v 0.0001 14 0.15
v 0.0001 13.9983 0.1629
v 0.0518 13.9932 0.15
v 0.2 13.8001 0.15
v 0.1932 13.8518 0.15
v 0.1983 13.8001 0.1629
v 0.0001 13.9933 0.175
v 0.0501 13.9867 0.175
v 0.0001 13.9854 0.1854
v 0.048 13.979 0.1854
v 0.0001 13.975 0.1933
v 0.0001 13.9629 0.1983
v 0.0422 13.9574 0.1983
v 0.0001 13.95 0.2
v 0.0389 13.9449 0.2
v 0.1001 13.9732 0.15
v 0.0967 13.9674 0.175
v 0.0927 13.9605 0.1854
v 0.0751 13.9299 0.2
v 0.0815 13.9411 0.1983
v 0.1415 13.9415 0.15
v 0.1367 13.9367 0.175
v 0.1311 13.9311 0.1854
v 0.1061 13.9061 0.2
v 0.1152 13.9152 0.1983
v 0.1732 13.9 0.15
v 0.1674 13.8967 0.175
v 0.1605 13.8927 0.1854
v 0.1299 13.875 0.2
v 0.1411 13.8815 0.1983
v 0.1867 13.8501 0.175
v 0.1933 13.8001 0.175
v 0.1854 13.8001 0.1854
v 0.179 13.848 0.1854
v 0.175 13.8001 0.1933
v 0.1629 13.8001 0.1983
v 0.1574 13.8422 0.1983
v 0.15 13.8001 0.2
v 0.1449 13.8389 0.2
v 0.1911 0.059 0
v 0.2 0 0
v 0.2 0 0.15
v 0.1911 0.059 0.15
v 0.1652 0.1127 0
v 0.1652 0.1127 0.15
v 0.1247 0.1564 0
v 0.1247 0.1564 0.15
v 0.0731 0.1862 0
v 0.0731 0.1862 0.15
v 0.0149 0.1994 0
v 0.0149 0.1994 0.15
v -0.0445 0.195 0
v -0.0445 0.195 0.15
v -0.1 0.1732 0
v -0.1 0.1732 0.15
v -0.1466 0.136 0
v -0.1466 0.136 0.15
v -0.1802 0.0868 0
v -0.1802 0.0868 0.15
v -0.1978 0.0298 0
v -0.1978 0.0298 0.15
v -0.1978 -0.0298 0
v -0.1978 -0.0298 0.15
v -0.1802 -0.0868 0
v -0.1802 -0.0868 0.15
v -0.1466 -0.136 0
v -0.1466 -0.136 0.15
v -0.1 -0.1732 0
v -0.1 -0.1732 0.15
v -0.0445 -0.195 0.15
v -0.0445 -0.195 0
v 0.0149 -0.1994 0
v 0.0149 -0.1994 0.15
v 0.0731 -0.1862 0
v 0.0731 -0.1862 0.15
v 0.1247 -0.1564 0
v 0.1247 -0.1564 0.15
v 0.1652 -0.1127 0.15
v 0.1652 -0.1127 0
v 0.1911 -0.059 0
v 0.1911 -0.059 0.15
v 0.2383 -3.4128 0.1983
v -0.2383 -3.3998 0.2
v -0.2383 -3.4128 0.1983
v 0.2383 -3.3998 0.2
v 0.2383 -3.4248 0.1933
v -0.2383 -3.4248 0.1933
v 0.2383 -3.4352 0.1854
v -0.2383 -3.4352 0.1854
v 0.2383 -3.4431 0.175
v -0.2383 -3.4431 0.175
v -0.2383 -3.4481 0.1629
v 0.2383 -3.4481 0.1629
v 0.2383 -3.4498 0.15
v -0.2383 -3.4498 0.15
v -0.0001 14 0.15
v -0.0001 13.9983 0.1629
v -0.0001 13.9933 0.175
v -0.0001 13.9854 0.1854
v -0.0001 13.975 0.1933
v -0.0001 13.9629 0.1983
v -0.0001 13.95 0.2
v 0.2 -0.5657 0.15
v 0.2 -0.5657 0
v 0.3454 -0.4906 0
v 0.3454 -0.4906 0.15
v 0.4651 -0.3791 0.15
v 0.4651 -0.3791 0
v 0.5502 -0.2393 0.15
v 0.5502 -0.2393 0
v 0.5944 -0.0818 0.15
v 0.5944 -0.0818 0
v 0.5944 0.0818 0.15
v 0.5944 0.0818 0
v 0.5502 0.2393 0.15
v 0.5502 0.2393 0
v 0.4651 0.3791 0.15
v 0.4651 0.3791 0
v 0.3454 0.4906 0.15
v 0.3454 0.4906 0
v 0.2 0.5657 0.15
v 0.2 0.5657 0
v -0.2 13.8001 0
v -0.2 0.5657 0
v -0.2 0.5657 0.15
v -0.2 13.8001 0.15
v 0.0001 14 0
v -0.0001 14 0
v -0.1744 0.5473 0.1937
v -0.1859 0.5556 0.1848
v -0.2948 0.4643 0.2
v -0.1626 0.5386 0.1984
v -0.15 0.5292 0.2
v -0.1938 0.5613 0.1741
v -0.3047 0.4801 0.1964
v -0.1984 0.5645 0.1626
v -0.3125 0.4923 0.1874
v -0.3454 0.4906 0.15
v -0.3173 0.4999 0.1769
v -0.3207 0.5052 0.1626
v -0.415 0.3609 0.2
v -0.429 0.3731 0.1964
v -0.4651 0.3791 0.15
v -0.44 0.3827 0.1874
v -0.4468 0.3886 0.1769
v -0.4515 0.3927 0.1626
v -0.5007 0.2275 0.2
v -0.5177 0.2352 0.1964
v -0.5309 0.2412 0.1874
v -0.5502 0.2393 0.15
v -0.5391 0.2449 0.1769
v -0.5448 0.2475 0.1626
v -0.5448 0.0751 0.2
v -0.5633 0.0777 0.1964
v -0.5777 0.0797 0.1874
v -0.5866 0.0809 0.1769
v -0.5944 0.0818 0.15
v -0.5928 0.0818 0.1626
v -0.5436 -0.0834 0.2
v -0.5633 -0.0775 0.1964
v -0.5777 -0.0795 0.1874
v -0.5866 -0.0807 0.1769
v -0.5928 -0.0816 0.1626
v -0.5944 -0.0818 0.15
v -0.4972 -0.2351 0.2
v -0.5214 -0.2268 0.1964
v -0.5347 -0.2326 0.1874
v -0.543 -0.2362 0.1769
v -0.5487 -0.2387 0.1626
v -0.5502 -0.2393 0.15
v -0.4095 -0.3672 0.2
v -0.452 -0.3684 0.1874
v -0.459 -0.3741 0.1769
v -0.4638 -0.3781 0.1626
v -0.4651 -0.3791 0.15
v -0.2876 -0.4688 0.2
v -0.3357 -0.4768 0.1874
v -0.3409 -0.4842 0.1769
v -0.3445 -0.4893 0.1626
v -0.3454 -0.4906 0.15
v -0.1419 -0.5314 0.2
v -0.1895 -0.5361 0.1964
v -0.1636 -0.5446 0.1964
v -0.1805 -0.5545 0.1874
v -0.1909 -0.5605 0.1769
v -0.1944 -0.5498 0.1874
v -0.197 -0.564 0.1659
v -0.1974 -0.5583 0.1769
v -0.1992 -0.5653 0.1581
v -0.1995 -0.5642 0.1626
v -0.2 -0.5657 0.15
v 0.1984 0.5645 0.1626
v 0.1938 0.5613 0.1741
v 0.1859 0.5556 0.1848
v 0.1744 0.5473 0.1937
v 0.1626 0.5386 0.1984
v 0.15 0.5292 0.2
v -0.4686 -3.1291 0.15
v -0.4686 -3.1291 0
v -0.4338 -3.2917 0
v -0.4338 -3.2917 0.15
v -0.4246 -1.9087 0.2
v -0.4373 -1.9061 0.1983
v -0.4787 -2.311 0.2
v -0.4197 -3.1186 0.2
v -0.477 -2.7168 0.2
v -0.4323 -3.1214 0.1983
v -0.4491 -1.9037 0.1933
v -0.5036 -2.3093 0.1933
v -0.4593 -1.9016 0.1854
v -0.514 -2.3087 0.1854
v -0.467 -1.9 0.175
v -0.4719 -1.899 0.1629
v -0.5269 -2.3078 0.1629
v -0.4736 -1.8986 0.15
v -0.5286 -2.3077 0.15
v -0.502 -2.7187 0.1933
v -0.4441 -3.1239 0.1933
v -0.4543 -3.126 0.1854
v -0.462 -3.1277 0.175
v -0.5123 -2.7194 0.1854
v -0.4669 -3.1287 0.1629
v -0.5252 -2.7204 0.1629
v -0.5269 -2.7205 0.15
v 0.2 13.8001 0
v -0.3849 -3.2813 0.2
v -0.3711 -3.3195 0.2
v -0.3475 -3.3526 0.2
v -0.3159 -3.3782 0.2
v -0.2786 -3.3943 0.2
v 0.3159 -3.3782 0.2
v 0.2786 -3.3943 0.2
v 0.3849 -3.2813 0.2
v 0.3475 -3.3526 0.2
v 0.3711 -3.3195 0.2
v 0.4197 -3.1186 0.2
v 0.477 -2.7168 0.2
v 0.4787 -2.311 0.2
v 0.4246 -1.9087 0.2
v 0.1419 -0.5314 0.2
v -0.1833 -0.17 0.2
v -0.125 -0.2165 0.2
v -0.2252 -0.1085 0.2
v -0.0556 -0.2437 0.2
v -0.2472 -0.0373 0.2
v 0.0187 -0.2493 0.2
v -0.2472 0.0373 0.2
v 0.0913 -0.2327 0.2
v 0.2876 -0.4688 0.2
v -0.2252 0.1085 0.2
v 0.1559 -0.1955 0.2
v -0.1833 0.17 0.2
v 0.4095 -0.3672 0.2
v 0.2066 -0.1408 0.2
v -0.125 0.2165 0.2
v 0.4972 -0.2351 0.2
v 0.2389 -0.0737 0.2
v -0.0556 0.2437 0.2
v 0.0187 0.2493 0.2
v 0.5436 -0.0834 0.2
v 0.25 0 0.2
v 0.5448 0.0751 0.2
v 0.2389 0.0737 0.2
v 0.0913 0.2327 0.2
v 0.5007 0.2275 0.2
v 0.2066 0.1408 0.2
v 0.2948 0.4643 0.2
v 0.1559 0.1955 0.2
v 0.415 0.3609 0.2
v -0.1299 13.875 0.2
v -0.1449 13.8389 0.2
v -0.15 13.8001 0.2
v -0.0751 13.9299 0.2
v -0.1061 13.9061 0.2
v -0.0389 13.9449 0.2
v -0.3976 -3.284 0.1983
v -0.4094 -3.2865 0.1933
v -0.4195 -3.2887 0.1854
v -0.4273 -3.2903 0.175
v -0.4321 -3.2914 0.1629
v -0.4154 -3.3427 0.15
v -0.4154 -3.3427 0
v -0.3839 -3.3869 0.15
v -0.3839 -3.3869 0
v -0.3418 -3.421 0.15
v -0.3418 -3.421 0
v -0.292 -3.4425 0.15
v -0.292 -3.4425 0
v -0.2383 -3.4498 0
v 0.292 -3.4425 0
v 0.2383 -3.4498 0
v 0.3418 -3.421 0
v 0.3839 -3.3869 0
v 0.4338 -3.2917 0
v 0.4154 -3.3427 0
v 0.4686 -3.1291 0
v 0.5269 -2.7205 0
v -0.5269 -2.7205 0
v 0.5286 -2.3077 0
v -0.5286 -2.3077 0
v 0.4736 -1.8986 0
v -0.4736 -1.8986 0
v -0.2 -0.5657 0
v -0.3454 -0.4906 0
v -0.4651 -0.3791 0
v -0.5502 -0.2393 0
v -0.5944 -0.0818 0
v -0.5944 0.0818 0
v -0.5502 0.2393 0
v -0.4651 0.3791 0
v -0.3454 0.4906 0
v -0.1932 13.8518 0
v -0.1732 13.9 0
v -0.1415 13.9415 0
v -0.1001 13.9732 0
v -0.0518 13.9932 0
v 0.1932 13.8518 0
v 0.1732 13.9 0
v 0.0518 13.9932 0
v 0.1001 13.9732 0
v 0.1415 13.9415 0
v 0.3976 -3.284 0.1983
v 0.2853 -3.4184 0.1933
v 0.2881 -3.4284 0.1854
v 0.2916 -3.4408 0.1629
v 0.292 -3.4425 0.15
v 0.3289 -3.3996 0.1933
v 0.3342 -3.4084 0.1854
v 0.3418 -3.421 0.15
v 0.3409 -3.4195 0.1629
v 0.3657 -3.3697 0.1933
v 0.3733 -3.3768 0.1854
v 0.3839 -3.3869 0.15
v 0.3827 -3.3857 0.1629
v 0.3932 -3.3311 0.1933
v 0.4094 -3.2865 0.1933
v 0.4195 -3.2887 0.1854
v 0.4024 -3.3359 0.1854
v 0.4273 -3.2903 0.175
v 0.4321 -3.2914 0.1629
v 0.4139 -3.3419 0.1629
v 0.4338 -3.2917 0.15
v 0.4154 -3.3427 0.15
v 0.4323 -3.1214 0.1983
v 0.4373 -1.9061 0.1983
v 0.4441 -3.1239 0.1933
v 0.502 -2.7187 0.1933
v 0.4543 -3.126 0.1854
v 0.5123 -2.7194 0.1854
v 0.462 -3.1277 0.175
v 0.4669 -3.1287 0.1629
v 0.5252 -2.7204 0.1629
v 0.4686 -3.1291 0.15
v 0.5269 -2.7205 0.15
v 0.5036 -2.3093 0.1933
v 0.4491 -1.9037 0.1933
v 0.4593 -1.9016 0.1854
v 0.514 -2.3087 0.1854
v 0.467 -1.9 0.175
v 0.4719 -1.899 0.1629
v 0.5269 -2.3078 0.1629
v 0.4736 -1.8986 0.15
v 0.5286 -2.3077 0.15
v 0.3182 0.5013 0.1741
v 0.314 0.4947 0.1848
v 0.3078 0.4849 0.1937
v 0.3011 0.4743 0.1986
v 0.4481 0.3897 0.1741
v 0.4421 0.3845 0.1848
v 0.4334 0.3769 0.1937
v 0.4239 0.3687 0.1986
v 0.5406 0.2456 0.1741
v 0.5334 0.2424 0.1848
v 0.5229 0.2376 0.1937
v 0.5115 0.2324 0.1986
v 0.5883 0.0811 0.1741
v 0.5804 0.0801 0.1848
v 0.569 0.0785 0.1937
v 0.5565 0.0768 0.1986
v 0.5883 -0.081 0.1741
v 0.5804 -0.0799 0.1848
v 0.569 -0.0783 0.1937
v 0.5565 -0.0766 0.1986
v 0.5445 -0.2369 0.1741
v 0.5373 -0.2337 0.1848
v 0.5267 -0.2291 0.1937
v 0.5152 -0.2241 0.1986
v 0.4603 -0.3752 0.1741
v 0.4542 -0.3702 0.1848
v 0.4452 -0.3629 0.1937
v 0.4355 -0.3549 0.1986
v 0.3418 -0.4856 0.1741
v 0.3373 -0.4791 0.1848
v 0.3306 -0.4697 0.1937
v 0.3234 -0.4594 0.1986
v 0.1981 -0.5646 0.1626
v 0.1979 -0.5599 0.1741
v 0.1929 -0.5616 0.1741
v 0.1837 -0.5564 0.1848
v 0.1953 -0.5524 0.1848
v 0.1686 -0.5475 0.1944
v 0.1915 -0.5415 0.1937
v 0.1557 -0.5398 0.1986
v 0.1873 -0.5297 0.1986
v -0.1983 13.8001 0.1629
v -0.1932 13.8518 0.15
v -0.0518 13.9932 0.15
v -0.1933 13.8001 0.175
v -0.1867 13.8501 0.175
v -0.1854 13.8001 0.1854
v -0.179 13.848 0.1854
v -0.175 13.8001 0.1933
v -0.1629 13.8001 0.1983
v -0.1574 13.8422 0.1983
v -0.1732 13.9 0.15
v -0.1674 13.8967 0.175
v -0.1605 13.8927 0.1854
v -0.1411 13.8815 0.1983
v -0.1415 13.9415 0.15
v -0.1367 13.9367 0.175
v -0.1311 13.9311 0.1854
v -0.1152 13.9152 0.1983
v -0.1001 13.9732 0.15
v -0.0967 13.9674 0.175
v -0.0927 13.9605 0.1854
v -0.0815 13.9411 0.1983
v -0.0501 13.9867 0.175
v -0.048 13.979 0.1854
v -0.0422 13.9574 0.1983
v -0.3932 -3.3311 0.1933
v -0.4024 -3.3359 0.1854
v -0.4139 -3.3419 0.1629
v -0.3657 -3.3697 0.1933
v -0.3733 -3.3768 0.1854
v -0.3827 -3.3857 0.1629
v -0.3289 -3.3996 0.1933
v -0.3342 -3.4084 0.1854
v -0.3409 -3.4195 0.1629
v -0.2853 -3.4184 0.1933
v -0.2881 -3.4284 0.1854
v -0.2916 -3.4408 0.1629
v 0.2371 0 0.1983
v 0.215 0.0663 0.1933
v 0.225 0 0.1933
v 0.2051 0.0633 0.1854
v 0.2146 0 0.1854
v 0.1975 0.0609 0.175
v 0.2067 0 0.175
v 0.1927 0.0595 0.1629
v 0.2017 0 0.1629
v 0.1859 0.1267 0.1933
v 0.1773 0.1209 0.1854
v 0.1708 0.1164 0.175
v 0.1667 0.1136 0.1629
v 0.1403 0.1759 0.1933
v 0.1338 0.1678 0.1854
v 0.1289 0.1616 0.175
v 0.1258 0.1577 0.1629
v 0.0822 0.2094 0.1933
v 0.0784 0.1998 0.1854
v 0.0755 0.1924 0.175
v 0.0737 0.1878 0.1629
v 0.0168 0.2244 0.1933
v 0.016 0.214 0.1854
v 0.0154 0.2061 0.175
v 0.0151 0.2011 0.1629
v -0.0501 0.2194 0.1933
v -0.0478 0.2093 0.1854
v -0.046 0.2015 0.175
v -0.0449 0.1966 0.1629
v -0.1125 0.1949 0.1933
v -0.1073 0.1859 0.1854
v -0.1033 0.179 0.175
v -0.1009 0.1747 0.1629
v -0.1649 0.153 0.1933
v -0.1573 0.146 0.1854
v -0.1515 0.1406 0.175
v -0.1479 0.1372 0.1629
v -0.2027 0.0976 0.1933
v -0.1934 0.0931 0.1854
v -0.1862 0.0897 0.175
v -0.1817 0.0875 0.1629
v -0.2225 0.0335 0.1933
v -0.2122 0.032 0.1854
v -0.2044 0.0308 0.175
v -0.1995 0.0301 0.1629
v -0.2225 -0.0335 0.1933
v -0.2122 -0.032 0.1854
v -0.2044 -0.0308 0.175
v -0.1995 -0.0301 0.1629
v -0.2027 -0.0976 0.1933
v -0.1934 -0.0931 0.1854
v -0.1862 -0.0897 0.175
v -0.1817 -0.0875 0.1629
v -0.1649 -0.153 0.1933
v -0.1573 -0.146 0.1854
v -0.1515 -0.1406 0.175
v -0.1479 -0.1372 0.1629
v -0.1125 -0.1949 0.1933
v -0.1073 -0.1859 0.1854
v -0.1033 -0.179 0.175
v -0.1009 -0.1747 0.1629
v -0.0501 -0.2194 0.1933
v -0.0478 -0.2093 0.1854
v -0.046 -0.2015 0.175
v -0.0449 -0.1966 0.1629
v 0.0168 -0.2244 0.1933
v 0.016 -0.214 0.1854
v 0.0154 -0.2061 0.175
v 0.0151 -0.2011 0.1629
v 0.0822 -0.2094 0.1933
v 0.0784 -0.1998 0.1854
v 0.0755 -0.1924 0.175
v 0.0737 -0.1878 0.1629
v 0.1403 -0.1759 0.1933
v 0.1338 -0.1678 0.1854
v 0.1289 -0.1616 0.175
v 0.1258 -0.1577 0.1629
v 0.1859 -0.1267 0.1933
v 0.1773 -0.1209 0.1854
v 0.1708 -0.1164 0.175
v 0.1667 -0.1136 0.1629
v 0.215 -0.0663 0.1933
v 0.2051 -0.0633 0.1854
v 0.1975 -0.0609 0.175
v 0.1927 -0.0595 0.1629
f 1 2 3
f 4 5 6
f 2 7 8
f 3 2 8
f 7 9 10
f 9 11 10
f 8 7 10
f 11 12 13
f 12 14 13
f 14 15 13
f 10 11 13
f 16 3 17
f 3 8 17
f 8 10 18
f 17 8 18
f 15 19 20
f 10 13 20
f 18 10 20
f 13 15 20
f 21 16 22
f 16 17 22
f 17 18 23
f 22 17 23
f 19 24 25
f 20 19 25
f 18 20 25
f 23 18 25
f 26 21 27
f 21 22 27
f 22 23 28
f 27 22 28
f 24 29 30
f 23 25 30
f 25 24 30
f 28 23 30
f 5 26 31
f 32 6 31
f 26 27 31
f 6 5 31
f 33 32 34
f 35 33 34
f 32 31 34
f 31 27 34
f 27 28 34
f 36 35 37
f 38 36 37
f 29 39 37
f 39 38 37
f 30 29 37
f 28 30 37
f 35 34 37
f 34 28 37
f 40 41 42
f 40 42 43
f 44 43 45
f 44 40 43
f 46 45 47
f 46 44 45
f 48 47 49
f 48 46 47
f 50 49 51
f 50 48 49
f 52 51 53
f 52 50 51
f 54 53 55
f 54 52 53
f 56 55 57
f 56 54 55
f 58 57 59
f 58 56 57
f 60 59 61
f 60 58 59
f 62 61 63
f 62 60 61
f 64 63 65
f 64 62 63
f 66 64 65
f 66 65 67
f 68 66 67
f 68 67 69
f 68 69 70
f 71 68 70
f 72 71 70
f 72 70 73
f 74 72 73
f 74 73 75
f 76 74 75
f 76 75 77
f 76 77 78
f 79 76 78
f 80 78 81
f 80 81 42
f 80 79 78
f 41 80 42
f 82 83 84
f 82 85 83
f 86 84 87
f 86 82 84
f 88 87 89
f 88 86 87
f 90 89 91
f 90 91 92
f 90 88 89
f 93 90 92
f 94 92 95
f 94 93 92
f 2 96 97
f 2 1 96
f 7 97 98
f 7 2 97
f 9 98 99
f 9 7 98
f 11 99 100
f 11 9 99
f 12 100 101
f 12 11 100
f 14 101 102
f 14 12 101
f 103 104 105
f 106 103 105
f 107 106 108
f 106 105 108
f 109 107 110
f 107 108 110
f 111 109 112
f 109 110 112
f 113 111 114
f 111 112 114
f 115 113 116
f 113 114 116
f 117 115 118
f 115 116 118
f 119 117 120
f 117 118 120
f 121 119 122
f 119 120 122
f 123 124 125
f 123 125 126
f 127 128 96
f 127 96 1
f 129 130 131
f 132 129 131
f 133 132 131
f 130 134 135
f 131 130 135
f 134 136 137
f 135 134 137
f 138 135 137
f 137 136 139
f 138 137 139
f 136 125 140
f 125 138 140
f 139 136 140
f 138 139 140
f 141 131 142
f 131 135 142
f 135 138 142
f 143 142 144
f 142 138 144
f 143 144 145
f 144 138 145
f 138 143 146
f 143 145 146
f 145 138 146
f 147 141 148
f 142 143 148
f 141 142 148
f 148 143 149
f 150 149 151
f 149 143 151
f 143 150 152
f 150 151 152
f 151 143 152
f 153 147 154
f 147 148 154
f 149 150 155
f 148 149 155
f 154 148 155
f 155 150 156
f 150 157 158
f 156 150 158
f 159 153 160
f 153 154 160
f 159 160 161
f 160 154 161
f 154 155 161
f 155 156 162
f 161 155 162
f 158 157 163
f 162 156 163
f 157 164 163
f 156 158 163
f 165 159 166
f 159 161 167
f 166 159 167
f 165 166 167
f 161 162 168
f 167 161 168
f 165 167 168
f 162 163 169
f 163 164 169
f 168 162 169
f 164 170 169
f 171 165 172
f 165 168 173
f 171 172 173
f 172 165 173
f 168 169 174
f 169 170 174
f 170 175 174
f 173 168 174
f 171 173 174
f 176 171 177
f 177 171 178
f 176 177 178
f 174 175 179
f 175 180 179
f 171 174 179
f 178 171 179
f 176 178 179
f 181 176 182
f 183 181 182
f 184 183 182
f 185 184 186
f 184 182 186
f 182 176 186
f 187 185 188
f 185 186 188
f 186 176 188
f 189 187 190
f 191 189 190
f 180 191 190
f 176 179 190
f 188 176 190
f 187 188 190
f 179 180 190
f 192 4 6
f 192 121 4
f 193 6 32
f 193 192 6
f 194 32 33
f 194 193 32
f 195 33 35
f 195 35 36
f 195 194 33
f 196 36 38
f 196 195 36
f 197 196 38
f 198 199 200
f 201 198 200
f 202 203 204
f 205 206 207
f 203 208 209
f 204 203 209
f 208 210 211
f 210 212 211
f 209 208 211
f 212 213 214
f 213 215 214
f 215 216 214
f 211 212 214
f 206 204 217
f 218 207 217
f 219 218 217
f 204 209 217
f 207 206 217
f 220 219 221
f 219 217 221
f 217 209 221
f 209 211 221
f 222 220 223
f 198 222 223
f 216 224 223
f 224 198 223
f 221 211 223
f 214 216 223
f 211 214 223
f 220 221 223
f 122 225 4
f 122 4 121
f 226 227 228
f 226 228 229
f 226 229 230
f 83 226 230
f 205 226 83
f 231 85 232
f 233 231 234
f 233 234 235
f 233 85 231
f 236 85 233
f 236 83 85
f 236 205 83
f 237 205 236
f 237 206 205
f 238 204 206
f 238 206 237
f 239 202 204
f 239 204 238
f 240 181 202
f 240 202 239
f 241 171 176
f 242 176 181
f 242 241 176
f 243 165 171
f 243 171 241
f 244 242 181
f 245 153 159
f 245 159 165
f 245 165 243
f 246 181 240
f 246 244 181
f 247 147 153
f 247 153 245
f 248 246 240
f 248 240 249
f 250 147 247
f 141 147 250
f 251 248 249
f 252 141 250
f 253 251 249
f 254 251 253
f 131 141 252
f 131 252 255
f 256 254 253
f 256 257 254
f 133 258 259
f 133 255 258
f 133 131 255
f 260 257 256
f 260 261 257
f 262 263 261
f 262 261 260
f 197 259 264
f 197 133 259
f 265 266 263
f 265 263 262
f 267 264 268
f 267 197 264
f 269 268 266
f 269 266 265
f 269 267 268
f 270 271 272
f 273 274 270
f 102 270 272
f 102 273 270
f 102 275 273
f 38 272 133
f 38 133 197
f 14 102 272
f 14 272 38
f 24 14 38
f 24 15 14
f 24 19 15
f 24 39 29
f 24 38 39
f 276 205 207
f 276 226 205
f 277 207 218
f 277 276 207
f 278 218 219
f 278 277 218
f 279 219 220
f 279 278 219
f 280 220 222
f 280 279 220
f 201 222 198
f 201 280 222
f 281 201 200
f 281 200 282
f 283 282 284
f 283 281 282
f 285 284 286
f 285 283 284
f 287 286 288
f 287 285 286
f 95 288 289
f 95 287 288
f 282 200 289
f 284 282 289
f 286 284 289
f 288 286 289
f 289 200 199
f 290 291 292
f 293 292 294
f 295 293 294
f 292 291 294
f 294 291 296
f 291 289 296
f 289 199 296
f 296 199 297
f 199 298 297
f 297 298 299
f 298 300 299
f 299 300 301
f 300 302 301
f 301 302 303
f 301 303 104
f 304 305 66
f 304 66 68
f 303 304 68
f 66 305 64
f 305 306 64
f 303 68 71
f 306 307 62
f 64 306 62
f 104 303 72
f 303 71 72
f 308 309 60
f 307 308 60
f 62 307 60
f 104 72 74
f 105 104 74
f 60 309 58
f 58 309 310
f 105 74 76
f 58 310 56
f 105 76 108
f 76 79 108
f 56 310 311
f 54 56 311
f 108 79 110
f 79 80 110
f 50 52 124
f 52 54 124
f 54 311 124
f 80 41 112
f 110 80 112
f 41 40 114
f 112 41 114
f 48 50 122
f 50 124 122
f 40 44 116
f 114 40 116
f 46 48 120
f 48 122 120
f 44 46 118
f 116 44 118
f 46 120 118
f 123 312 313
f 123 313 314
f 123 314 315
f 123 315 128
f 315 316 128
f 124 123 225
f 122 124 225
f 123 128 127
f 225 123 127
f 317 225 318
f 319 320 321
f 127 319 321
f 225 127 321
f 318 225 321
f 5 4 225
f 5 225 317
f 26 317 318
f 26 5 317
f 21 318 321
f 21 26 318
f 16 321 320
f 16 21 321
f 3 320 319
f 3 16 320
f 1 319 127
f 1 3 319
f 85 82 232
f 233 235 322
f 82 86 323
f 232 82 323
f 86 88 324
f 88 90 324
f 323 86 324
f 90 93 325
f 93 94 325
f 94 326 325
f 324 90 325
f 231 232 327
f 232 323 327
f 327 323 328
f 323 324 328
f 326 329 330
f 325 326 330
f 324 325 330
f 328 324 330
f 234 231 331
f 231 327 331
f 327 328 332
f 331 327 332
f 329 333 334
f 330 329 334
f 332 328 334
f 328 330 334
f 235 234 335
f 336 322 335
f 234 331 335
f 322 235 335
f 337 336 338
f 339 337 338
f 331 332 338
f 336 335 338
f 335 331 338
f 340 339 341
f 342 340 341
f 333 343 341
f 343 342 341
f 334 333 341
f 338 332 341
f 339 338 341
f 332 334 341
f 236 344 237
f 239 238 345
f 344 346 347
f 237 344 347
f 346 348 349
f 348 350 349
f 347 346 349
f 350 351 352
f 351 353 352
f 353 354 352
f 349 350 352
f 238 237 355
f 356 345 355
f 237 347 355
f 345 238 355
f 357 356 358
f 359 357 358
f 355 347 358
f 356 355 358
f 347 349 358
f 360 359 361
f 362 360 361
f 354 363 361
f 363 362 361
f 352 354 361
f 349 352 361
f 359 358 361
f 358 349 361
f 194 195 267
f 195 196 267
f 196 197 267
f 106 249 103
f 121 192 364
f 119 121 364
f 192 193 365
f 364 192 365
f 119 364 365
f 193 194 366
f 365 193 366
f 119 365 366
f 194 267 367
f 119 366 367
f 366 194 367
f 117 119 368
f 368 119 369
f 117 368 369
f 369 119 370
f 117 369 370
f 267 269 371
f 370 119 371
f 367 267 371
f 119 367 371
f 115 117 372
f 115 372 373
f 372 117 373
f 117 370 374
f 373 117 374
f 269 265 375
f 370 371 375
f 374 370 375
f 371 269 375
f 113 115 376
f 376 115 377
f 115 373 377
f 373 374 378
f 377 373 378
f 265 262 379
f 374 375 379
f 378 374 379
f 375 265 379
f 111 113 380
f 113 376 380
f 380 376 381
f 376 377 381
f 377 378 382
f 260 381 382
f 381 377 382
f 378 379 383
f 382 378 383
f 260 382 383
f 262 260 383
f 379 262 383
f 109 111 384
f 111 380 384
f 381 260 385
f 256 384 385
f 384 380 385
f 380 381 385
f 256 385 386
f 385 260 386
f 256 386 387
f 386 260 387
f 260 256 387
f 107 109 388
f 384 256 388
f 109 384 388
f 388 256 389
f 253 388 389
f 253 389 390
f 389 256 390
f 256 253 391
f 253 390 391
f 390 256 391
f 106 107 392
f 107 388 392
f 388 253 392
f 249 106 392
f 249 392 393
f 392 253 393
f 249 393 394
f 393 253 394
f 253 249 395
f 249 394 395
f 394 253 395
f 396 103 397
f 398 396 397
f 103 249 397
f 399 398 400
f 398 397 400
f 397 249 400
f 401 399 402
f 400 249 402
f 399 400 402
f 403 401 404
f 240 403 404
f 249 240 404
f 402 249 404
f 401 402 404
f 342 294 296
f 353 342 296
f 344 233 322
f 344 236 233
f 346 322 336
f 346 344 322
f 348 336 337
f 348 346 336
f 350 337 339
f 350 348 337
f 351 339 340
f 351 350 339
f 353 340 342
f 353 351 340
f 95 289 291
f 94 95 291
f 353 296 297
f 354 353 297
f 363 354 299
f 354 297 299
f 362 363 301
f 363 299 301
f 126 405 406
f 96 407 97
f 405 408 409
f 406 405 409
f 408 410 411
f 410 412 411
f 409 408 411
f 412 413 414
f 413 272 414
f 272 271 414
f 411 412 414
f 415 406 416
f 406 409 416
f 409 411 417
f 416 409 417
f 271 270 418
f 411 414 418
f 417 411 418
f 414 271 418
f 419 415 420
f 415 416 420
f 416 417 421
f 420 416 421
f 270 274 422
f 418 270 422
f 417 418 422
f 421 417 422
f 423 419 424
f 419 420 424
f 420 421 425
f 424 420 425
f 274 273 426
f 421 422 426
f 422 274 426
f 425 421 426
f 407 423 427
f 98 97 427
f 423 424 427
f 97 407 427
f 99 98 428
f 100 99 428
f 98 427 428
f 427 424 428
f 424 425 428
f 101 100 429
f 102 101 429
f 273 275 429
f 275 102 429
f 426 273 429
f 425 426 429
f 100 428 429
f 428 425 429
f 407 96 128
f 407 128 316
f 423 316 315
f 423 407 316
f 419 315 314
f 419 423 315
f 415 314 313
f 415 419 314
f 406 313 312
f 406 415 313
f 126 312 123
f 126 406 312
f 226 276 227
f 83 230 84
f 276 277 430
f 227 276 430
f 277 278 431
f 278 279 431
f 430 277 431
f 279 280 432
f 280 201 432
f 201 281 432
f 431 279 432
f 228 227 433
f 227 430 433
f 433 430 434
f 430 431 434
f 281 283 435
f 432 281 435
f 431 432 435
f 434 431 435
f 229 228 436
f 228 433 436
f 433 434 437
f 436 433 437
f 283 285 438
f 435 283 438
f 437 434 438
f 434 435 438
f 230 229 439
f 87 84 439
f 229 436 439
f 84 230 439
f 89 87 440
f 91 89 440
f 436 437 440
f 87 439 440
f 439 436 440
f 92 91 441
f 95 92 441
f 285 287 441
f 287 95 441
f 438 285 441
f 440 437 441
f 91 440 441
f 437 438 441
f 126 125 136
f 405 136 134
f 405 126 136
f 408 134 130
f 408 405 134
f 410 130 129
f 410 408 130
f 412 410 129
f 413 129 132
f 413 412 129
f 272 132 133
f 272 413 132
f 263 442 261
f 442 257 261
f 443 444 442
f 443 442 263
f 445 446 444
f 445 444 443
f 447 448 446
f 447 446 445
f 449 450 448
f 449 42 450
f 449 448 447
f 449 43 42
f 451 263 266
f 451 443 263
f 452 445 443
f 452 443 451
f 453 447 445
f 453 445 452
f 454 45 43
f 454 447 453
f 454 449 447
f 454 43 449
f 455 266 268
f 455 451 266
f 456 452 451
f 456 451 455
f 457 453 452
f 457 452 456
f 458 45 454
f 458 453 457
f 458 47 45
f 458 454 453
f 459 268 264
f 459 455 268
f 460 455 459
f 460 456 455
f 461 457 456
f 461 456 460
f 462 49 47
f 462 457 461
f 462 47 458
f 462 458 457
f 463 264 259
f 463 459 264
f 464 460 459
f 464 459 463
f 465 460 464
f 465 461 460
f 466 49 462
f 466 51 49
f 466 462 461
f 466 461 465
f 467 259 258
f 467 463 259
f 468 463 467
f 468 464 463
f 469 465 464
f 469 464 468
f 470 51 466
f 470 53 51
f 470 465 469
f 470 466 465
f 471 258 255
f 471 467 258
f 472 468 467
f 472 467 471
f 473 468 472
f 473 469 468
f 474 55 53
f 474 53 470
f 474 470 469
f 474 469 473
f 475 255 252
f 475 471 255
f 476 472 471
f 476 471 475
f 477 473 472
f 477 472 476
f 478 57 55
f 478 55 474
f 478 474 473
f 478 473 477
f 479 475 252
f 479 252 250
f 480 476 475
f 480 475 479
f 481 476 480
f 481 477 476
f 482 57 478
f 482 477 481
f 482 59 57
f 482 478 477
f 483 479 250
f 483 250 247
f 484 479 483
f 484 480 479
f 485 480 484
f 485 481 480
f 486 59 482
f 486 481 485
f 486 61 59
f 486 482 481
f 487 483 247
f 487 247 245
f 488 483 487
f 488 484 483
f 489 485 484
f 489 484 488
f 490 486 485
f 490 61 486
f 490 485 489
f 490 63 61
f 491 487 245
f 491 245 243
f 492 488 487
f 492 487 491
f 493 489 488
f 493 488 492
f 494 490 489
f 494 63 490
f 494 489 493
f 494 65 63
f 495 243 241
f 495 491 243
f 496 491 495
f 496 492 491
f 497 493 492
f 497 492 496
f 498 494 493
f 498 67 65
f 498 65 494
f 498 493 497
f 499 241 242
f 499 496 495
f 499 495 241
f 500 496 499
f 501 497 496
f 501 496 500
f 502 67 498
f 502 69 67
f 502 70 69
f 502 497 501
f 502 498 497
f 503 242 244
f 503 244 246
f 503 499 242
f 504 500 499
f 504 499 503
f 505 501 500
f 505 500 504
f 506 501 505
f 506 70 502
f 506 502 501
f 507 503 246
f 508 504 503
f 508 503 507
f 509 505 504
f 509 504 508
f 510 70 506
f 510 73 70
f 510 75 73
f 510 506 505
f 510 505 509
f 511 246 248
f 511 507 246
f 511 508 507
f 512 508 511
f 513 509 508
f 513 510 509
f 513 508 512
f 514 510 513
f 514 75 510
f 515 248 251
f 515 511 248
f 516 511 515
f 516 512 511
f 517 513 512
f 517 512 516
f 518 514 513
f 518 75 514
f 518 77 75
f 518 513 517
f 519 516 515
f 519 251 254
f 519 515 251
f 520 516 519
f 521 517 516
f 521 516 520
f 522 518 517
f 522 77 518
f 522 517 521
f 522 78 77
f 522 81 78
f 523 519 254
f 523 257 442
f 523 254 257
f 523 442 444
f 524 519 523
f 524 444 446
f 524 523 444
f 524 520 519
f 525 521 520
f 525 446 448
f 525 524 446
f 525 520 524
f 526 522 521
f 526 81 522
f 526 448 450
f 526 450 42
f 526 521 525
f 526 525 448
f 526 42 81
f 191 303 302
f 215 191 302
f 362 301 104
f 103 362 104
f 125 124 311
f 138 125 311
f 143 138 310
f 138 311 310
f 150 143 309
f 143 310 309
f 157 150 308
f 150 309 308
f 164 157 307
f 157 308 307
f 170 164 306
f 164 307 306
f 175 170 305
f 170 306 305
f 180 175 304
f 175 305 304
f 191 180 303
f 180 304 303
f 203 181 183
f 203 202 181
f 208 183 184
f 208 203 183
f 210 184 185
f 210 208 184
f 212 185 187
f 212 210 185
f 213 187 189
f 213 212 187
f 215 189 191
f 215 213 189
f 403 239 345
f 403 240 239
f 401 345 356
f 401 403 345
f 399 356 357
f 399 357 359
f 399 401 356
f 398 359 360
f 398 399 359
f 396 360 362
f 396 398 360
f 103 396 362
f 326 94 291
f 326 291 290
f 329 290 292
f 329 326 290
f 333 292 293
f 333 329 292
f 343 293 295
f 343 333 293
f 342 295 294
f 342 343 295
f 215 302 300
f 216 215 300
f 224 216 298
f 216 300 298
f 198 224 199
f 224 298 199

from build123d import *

# Parameters (mm, degrees)
SKETCH_1_R      = 0.6
SKETCH_1_R_2    = 0.2
EXTRUDE_1_DEPTH = 0.2
EXTRUDE_START   = -0.2
EXTRUDE_2_DEPTH = 0.2
FILLET_1_R      = 0.2
FILLET_2_R      = 0.05


with BuildPart() as part:
    # Эскиз1 → Бобышка-Вытянуть1 (new body)
    with BuildSketch(Plane.XY):
        Circle(SKETCH_1_R)
        Circle(SKETCH_1_R_2, mode=Mode.SUBTRACT)
    extrude(amount=EXTRUDE_1_DEPTH)

    # Эскиз3 → Бобышка-Вытянуть2 (add)
    with BuildSketch(Plane.XY.offset(0.2).offset(EXTRUDE_START)):
        with BuildLine():
            Line((-0.2, 0.565685425), (-0.2, 14))
            Line((-0.2, 14), (0.2, 14))
            Line((0.2, 14), (0.2, 0.565685425))
            ThreePointArc((0.2, 0.565685425), (0, 0.6), (-0.2, 0.565685425))
        make_face()
        with BuildLine():
            Line((-0.2, -0.565685425), (-0.473607186, -1.89863889))
            ThreePointArc((-0.473607186, -1.89863889), (-0.53485247, -2.514130031), (-0.468572045, -3.129099328))
            Line((-0.468572045, -3.129099328), (-0.4, -3.44981817))
            Line((-0.4, -3.44981817), (0.4, -3.44981817))
            Line((0.4, -3.44981817), (0.468572045, -3.129099328))
            ThreePointArc((0.468572045, -3.129099328), (0.53485247, -2.514130031), (0.473607186, -1.89863889))
            Line((0.473607186, -1.89863889), (0.2, -0.565685425))
            ThreePointArc((0.2, -0.565685425), (0, -0.6), (-0.2, -0.565685425))
        make_face()
    extrude(amount=EXTRUDE_2_DEPTH)

    # Скругление1
    fillet_1_edges = [part.edges().sort_by_distance(p)[0] for p in [
        (-0.4, -3.44981817, 0.1),
        (0.4, -3.44981817, 0.1),
        (-0.2, 14, 0.1),
        (0.2, 14, 0.1),
    ]]
    fillet(fillet_1_edges, radius=FILLET_1_R - 0.0001)  # a hair under: the kernel refuses the full size

    # Скругление2
    fillet_2_edges = [part.edges().sort_by_distance(p)[0] for p in [
        (0.2, 7.182892712, 0.2),
        (0.6, 0, 0.2),
        (-0.336803593, -1.232162158, 0.2),
        (-0.53485247, -2.514130031, 0.2),
        (-0.451187979, -3.210406476, 0.2),
        (0.53485247, -2.514130031, 0.2),
        (0.336803593, -1.232162158, 0.2),
        (0, -3.44981817, 0.2),
        (0.451187979, -3.210406476, 0.2),
        (-0.2, 7.182892712, 0.2),
        (0.364030264, -3.405344875, 0.2),
        (-0.364030264, -3.405344875, 0.2),
        (0.141450646, 13.941450646, 0.2),
        (-0.141450646, 13.941450646, 0.2),
        (-0.2, 0, 0.2),
        (-0.6, 0, 0.2),
    ]]
    fillet(fillet_2_edges, radius=FILLET_2_R)


solid = part.part
